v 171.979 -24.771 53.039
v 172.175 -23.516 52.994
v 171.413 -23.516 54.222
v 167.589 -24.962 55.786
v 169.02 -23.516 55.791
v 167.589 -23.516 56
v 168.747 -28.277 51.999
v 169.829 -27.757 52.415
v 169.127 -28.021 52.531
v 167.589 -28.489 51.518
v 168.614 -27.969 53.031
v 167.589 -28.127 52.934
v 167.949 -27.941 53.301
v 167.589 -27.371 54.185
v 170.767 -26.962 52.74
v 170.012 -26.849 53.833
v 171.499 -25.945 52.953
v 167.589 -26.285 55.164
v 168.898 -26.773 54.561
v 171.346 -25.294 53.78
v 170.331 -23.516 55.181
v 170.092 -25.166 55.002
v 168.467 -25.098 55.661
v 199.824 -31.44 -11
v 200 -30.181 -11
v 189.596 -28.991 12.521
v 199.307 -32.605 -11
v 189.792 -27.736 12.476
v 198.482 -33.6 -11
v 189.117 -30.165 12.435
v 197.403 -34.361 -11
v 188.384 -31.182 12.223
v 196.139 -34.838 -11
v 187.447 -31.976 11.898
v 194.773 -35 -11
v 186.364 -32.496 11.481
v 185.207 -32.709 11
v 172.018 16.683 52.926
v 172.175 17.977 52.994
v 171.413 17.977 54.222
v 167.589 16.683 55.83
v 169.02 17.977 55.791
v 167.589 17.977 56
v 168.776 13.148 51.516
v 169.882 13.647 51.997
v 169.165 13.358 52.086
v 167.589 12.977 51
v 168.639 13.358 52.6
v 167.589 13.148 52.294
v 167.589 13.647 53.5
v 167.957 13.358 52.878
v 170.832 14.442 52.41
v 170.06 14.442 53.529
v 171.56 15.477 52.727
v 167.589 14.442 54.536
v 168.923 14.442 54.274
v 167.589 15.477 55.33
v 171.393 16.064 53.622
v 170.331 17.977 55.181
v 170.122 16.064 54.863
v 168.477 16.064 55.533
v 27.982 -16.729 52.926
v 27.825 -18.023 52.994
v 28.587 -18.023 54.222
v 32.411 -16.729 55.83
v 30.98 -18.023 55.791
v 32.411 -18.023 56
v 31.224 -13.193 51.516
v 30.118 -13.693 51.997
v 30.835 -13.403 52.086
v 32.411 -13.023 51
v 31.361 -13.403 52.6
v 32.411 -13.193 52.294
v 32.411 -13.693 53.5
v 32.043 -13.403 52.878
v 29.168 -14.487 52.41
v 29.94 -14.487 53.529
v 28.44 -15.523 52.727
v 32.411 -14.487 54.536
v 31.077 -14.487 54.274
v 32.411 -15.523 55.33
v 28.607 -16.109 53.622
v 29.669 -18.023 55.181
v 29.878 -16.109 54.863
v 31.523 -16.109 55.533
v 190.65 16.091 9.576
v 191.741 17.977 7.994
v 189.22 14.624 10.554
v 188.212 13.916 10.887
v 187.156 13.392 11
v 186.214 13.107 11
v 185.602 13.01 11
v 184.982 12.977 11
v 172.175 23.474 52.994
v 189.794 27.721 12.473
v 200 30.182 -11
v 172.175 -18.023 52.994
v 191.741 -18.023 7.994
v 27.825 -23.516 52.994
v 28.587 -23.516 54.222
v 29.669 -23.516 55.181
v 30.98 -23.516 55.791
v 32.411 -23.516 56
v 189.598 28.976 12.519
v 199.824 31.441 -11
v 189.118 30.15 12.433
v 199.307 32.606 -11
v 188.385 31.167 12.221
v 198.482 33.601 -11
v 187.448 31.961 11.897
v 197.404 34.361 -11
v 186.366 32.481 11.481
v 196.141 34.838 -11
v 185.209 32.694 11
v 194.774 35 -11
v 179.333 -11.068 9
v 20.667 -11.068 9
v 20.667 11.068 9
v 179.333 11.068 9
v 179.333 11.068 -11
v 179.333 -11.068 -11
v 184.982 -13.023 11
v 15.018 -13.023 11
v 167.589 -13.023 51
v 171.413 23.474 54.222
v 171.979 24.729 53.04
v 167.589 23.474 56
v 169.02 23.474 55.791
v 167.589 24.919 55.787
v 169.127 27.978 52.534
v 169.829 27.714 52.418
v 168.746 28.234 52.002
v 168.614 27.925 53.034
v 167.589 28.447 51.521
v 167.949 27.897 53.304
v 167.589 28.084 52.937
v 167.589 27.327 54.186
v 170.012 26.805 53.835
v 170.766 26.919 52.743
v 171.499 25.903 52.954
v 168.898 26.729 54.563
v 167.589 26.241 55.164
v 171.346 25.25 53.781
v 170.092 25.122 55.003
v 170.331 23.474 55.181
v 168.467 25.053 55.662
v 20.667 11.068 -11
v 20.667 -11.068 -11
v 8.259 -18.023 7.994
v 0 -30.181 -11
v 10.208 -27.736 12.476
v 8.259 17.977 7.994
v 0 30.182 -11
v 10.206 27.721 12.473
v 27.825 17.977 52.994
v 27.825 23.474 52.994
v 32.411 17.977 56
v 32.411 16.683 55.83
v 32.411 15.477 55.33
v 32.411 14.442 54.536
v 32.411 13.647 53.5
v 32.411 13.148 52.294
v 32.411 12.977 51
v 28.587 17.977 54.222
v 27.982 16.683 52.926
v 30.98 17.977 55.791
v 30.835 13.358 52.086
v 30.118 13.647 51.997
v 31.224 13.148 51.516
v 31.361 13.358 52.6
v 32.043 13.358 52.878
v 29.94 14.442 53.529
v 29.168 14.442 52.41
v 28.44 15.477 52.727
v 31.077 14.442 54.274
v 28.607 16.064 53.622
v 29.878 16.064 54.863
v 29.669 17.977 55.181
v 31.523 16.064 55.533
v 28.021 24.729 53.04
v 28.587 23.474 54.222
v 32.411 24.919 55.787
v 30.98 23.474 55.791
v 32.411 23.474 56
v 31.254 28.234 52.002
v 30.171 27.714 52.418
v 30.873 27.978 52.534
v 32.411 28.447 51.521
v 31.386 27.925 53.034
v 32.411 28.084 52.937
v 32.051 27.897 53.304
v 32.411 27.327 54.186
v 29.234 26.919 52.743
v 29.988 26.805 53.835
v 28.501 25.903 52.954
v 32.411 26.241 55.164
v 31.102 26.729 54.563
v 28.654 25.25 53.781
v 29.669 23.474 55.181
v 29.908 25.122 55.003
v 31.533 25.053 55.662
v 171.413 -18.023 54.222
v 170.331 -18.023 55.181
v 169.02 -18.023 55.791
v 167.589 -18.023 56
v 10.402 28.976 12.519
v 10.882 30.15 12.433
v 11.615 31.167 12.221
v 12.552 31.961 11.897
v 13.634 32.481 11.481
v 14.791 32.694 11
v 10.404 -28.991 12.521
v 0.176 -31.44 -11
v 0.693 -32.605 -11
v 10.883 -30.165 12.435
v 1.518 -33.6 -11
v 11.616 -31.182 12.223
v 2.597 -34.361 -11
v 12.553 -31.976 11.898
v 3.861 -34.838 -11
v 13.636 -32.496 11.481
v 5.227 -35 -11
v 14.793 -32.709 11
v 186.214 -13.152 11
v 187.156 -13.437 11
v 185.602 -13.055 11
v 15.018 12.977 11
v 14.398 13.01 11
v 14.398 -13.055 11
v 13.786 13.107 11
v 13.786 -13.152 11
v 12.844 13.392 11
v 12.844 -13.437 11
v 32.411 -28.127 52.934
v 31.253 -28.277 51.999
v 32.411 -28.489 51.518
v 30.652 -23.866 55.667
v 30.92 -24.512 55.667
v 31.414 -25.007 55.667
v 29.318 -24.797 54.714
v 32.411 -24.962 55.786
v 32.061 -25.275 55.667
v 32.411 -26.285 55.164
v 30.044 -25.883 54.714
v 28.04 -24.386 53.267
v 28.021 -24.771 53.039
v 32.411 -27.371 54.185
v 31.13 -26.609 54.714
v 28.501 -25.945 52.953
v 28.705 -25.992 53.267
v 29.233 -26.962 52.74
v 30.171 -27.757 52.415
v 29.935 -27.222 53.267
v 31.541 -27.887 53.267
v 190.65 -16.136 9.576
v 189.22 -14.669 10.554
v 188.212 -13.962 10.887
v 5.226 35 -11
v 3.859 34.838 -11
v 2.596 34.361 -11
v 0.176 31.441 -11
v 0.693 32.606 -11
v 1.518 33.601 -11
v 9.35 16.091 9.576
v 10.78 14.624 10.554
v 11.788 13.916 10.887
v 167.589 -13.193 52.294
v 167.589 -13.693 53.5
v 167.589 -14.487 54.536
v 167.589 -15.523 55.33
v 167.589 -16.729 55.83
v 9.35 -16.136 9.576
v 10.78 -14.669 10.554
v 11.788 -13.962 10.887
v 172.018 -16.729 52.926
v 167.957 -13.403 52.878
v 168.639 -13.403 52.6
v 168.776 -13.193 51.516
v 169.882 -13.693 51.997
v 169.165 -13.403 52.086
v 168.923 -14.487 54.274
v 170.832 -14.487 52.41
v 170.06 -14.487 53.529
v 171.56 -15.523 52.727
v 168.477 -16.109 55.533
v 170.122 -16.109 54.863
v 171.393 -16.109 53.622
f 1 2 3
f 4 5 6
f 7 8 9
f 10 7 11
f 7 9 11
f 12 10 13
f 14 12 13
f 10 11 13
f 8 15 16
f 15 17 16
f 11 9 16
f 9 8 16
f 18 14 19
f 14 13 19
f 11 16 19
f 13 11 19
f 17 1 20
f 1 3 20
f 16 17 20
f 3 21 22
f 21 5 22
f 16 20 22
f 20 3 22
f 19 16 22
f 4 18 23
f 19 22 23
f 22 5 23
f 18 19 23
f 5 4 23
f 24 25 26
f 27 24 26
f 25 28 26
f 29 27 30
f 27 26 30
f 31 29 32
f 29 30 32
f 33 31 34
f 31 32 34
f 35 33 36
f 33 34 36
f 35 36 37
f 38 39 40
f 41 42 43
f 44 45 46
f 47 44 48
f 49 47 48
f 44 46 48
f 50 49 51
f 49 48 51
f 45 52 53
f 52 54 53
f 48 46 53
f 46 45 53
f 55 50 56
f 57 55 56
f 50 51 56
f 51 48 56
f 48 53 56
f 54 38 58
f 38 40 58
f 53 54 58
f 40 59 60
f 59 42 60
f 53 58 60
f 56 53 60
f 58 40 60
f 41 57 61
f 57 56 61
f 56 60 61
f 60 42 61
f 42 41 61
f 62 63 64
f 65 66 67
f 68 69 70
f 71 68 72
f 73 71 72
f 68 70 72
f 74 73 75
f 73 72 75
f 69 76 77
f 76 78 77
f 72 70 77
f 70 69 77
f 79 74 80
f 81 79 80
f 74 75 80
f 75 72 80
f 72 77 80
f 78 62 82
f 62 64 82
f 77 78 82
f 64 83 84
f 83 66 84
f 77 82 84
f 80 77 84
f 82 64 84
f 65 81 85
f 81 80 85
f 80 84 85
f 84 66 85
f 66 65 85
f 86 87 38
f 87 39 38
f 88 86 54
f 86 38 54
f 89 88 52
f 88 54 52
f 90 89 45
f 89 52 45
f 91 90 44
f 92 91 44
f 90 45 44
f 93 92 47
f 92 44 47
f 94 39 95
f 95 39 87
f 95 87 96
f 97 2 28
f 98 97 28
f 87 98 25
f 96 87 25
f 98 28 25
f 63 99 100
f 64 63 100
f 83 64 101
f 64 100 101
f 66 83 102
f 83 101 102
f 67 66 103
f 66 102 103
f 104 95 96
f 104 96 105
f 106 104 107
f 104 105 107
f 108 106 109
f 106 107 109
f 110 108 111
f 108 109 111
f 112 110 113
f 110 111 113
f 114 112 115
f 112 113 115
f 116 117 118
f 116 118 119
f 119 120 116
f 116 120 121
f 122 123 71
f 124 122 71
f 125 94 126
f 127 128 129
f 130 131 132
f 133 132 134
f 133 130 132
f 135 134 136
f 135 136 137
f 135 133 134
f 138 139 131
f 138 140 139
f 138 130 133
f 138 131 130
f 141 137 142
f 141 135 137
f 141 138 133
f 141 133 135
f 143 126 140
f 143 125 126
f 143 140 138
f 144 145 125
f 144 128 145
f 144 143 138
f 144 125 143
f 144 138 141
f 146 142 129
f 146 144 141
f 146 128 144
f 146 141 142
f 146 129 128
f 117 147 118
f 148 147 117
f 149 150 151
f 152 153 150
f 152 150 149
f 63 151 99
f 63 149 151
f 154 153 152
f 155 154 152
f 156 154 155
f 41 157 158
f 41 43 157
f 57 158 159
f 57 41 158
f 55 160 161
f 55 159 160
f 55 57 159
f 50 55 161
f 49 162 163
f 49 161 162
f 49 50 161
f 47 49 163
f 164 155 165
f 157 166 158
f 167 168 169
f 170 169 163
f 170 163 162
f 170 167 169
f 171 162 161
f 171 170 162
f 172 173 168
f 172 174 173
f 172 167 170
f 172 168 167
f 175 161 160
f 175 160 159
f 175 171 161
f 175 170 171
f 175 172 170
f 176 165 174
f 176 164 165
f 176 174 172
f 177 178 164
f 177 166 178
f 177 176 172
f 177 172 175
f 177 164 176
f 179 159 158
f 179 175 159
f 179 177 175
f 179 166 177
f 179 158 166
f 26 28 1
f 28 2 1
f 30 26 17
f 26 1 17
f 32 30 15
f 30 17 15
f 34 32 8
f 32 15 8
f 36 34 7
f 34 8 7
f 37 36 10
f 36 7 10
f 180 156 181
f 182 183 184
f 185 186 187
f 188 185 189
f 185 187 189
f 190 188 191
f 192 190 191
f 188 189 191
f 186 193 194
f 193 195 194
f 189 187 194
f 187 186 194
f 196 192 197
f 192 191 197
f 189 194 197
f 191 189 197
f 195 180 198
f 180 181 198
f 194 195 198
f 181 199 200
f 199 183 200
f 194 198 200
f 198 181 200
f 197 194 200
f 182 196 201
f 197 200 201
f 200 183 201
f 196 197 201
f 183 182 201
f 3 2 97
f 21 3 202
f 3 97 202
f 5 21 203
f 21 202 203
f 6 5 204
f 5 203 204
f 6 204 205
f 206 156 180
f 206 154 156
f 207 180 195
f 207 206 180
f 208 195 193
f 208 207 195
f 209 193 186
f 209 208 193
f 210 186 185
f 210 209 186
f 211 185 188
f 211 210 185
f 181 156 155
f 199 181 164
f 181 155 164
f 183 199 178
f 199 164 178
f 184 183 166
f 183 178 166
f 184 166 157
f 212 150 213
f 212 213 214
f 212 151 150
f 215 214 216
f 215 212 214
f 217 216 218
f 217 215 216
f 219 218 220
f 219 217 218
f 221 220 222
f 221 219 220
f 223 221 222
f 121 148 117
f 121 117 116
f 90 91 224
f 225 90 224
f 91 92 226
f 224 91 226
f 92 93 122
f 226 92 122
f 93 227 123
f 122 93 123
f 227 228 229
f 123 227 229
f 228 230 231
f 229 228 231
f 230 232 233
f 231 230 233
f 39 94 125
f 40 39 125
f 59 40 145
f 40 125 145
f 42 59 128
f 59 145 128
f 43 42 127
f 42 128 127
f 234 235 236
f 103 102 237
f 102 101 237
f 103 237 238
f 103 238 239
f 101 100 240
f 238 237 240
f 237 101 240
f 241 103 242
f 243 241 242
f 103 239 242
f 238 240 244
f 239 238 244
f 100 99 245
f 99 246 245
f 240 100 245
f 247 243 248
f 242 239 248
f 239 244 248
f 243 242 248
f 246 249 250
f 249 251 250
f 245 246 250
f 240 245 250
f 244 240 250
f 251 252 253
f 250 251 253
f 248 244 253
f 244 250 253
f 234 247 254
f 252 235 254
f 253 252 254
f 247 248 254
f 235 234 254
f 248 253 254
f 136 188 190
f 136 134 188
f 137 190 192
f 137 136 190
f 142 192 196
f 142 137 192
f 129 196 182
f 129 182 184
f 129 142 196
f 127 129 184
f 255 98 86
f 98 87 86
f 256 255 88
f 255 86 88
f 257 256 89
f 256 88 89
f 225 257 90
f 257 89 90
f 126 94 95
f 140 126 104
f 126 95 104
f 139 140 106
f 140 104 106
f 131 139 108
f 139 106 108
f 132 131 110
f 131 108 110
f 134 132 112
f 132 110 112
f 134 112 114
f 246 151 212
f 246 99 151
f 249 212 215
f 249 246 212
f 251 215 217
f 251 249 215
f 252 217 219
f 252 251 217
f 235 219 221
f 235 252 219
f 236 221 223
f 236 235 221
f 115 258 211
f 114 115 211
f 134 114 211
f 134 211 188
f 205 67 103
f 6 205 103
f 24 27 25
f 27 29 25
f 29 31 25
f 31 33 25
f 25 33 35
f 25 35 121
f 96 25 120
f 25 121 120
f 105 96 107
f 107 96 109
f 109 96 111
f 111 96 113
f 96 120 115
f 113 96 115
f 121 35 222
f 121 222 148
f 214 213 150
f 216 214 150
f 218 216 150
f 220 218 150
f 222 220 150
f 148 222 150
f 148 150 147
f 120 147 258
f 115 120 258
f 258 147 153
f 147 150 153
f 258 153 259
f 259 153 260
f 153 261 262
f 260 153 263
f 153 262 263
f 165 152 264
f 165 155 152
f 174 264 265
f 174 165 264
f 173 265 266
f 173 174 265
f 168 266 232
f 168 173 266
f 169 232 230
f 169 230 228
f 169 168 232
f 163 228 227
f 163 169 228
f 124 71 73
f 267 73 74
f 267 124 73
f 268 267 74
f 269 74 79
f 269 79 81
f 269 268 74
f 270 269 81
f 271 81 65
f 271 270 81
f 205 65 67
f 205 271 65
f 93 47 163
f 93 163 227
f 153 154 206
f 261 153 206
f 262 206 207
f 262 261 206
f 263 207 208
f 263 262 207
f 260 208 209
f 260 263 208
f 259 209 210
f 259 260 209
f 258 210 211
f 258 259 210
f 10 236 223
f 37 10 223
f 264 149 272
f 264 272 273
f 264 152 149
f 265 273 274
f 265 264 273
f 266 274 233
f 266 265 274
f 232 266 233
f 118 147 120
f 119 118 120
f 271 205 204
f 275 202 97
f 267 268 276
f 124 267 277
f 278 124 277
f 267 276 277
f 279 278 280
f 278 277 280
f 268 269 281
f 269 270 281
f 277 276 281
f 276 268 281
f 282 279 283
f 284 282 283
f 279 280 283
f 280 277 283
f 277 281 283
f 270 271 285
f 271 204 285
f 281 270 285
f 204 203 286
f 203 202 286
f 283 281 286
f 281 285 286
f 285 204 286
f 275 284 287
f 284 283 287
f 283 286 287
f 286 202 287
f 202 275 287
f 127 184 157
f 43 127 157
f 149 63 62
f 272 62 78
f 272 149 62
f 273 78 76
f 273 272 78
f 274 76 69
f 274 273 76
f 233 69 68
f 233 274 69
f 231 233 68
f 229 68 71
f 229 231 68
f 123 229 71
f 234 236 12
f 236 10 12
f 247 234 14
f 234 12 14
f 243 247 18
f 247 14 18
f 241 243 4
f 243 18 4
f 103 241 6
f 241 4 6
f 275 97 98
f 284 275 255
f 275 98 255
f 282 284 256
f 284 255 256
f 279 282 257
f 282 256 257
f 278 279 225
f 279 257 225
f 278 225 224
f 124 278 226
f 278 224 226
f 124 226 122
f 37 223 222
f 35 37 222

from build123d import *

# Parameters (mm, degrees)
F1_DEPTH = 200
F2_W     = 158.6660303175
F2_H     = 22.1358127892
F3_DEPTH = 20
F5_DEPTH = 75
F7_R     = 5


# Not quite as in the source:
# - a feature of the source that left no trace in its solid (it failed there, or was rolled back) is left out
# - a feature names something its author has since deleted; it is built from what else it names


with BuildPart() as f1:
    # F0 (on Right) → F1 (new body)
    with BuildSketch(Plane.YZ):
        Polygon((12.9773180083, 11), (-13.0226819917, 11), (-32.7089403555, 11), (-35, -11), (35, -11), (32.6940447192, 11), align=None)
        Polygon((12.9773180083, 56), (12.9773180083, 11), (32.6940447192, 11), (27.9773180083, 56), align=None)
        Polygon((-32.7089403555, 11), (-13.0226819917, 11), (-13.0226819917, 56), (-28.0226819917, 56), align=None)
    extrude(amount=F1_DEPTH)

    # F2 (on face) → F3 (cut)
    with BuildSketch(Plane(origin=(0, 0, -11), x_dir=(1, 0, 0), z_dir=(0, 0, -1))):
        with Locations((100, 0)):
            Rectangle(F2_W, F2_H)
    extrude(amount=-F3_DEPTH, mode=Mode.SUBTRACT)

    # F4 (on Front) → F5 (cut, symmetric)
    with BuildSketch(Plane.XZ):
        Polygon((0, -11), (29.1324291224, 56), (0, 56), align=None)
        Polygon((200, -11), (200, 56), (170.8675708776, 56), align=None)
    extrude(amount=F5_DEPTH, both=True, mode=Mode.SUBTRACT)

    # F7
    f7_edges = [f1.edges().sort_by_distance(p)[0] for p in [
        (29.132429, 20.477318, 56),
        (9.565872, -0.022682, 11),
        (190.434128, -0.022682, 11),
        (14.566215, -31.511341, 22.5),
        (29.132429, -20.522682, 56),
        (19.349151, -13.022682, 33.5),
        (19.349151, 12.977318, 33.5),
        (14.566215, 31.488659, 22.5),
        (100, -13.022682, 56),
        (180.650849, -13.022682, 33.5),
        (170.867571, 20.477318, 56),
        (180.650849, 12.977318, 33.5),
        (170.867571, -20.522682, 56),
        (185.433785, -31.511341, 22.5),
        (185.433785, 31.488659, 22.5),
        (100, 12.977318, 56),
        (100, -28.022682, 56),
        (100, 27.977318, 56),
    ]]
    fillet(f7_edges, radius=F7_R)


solid = f1.part
